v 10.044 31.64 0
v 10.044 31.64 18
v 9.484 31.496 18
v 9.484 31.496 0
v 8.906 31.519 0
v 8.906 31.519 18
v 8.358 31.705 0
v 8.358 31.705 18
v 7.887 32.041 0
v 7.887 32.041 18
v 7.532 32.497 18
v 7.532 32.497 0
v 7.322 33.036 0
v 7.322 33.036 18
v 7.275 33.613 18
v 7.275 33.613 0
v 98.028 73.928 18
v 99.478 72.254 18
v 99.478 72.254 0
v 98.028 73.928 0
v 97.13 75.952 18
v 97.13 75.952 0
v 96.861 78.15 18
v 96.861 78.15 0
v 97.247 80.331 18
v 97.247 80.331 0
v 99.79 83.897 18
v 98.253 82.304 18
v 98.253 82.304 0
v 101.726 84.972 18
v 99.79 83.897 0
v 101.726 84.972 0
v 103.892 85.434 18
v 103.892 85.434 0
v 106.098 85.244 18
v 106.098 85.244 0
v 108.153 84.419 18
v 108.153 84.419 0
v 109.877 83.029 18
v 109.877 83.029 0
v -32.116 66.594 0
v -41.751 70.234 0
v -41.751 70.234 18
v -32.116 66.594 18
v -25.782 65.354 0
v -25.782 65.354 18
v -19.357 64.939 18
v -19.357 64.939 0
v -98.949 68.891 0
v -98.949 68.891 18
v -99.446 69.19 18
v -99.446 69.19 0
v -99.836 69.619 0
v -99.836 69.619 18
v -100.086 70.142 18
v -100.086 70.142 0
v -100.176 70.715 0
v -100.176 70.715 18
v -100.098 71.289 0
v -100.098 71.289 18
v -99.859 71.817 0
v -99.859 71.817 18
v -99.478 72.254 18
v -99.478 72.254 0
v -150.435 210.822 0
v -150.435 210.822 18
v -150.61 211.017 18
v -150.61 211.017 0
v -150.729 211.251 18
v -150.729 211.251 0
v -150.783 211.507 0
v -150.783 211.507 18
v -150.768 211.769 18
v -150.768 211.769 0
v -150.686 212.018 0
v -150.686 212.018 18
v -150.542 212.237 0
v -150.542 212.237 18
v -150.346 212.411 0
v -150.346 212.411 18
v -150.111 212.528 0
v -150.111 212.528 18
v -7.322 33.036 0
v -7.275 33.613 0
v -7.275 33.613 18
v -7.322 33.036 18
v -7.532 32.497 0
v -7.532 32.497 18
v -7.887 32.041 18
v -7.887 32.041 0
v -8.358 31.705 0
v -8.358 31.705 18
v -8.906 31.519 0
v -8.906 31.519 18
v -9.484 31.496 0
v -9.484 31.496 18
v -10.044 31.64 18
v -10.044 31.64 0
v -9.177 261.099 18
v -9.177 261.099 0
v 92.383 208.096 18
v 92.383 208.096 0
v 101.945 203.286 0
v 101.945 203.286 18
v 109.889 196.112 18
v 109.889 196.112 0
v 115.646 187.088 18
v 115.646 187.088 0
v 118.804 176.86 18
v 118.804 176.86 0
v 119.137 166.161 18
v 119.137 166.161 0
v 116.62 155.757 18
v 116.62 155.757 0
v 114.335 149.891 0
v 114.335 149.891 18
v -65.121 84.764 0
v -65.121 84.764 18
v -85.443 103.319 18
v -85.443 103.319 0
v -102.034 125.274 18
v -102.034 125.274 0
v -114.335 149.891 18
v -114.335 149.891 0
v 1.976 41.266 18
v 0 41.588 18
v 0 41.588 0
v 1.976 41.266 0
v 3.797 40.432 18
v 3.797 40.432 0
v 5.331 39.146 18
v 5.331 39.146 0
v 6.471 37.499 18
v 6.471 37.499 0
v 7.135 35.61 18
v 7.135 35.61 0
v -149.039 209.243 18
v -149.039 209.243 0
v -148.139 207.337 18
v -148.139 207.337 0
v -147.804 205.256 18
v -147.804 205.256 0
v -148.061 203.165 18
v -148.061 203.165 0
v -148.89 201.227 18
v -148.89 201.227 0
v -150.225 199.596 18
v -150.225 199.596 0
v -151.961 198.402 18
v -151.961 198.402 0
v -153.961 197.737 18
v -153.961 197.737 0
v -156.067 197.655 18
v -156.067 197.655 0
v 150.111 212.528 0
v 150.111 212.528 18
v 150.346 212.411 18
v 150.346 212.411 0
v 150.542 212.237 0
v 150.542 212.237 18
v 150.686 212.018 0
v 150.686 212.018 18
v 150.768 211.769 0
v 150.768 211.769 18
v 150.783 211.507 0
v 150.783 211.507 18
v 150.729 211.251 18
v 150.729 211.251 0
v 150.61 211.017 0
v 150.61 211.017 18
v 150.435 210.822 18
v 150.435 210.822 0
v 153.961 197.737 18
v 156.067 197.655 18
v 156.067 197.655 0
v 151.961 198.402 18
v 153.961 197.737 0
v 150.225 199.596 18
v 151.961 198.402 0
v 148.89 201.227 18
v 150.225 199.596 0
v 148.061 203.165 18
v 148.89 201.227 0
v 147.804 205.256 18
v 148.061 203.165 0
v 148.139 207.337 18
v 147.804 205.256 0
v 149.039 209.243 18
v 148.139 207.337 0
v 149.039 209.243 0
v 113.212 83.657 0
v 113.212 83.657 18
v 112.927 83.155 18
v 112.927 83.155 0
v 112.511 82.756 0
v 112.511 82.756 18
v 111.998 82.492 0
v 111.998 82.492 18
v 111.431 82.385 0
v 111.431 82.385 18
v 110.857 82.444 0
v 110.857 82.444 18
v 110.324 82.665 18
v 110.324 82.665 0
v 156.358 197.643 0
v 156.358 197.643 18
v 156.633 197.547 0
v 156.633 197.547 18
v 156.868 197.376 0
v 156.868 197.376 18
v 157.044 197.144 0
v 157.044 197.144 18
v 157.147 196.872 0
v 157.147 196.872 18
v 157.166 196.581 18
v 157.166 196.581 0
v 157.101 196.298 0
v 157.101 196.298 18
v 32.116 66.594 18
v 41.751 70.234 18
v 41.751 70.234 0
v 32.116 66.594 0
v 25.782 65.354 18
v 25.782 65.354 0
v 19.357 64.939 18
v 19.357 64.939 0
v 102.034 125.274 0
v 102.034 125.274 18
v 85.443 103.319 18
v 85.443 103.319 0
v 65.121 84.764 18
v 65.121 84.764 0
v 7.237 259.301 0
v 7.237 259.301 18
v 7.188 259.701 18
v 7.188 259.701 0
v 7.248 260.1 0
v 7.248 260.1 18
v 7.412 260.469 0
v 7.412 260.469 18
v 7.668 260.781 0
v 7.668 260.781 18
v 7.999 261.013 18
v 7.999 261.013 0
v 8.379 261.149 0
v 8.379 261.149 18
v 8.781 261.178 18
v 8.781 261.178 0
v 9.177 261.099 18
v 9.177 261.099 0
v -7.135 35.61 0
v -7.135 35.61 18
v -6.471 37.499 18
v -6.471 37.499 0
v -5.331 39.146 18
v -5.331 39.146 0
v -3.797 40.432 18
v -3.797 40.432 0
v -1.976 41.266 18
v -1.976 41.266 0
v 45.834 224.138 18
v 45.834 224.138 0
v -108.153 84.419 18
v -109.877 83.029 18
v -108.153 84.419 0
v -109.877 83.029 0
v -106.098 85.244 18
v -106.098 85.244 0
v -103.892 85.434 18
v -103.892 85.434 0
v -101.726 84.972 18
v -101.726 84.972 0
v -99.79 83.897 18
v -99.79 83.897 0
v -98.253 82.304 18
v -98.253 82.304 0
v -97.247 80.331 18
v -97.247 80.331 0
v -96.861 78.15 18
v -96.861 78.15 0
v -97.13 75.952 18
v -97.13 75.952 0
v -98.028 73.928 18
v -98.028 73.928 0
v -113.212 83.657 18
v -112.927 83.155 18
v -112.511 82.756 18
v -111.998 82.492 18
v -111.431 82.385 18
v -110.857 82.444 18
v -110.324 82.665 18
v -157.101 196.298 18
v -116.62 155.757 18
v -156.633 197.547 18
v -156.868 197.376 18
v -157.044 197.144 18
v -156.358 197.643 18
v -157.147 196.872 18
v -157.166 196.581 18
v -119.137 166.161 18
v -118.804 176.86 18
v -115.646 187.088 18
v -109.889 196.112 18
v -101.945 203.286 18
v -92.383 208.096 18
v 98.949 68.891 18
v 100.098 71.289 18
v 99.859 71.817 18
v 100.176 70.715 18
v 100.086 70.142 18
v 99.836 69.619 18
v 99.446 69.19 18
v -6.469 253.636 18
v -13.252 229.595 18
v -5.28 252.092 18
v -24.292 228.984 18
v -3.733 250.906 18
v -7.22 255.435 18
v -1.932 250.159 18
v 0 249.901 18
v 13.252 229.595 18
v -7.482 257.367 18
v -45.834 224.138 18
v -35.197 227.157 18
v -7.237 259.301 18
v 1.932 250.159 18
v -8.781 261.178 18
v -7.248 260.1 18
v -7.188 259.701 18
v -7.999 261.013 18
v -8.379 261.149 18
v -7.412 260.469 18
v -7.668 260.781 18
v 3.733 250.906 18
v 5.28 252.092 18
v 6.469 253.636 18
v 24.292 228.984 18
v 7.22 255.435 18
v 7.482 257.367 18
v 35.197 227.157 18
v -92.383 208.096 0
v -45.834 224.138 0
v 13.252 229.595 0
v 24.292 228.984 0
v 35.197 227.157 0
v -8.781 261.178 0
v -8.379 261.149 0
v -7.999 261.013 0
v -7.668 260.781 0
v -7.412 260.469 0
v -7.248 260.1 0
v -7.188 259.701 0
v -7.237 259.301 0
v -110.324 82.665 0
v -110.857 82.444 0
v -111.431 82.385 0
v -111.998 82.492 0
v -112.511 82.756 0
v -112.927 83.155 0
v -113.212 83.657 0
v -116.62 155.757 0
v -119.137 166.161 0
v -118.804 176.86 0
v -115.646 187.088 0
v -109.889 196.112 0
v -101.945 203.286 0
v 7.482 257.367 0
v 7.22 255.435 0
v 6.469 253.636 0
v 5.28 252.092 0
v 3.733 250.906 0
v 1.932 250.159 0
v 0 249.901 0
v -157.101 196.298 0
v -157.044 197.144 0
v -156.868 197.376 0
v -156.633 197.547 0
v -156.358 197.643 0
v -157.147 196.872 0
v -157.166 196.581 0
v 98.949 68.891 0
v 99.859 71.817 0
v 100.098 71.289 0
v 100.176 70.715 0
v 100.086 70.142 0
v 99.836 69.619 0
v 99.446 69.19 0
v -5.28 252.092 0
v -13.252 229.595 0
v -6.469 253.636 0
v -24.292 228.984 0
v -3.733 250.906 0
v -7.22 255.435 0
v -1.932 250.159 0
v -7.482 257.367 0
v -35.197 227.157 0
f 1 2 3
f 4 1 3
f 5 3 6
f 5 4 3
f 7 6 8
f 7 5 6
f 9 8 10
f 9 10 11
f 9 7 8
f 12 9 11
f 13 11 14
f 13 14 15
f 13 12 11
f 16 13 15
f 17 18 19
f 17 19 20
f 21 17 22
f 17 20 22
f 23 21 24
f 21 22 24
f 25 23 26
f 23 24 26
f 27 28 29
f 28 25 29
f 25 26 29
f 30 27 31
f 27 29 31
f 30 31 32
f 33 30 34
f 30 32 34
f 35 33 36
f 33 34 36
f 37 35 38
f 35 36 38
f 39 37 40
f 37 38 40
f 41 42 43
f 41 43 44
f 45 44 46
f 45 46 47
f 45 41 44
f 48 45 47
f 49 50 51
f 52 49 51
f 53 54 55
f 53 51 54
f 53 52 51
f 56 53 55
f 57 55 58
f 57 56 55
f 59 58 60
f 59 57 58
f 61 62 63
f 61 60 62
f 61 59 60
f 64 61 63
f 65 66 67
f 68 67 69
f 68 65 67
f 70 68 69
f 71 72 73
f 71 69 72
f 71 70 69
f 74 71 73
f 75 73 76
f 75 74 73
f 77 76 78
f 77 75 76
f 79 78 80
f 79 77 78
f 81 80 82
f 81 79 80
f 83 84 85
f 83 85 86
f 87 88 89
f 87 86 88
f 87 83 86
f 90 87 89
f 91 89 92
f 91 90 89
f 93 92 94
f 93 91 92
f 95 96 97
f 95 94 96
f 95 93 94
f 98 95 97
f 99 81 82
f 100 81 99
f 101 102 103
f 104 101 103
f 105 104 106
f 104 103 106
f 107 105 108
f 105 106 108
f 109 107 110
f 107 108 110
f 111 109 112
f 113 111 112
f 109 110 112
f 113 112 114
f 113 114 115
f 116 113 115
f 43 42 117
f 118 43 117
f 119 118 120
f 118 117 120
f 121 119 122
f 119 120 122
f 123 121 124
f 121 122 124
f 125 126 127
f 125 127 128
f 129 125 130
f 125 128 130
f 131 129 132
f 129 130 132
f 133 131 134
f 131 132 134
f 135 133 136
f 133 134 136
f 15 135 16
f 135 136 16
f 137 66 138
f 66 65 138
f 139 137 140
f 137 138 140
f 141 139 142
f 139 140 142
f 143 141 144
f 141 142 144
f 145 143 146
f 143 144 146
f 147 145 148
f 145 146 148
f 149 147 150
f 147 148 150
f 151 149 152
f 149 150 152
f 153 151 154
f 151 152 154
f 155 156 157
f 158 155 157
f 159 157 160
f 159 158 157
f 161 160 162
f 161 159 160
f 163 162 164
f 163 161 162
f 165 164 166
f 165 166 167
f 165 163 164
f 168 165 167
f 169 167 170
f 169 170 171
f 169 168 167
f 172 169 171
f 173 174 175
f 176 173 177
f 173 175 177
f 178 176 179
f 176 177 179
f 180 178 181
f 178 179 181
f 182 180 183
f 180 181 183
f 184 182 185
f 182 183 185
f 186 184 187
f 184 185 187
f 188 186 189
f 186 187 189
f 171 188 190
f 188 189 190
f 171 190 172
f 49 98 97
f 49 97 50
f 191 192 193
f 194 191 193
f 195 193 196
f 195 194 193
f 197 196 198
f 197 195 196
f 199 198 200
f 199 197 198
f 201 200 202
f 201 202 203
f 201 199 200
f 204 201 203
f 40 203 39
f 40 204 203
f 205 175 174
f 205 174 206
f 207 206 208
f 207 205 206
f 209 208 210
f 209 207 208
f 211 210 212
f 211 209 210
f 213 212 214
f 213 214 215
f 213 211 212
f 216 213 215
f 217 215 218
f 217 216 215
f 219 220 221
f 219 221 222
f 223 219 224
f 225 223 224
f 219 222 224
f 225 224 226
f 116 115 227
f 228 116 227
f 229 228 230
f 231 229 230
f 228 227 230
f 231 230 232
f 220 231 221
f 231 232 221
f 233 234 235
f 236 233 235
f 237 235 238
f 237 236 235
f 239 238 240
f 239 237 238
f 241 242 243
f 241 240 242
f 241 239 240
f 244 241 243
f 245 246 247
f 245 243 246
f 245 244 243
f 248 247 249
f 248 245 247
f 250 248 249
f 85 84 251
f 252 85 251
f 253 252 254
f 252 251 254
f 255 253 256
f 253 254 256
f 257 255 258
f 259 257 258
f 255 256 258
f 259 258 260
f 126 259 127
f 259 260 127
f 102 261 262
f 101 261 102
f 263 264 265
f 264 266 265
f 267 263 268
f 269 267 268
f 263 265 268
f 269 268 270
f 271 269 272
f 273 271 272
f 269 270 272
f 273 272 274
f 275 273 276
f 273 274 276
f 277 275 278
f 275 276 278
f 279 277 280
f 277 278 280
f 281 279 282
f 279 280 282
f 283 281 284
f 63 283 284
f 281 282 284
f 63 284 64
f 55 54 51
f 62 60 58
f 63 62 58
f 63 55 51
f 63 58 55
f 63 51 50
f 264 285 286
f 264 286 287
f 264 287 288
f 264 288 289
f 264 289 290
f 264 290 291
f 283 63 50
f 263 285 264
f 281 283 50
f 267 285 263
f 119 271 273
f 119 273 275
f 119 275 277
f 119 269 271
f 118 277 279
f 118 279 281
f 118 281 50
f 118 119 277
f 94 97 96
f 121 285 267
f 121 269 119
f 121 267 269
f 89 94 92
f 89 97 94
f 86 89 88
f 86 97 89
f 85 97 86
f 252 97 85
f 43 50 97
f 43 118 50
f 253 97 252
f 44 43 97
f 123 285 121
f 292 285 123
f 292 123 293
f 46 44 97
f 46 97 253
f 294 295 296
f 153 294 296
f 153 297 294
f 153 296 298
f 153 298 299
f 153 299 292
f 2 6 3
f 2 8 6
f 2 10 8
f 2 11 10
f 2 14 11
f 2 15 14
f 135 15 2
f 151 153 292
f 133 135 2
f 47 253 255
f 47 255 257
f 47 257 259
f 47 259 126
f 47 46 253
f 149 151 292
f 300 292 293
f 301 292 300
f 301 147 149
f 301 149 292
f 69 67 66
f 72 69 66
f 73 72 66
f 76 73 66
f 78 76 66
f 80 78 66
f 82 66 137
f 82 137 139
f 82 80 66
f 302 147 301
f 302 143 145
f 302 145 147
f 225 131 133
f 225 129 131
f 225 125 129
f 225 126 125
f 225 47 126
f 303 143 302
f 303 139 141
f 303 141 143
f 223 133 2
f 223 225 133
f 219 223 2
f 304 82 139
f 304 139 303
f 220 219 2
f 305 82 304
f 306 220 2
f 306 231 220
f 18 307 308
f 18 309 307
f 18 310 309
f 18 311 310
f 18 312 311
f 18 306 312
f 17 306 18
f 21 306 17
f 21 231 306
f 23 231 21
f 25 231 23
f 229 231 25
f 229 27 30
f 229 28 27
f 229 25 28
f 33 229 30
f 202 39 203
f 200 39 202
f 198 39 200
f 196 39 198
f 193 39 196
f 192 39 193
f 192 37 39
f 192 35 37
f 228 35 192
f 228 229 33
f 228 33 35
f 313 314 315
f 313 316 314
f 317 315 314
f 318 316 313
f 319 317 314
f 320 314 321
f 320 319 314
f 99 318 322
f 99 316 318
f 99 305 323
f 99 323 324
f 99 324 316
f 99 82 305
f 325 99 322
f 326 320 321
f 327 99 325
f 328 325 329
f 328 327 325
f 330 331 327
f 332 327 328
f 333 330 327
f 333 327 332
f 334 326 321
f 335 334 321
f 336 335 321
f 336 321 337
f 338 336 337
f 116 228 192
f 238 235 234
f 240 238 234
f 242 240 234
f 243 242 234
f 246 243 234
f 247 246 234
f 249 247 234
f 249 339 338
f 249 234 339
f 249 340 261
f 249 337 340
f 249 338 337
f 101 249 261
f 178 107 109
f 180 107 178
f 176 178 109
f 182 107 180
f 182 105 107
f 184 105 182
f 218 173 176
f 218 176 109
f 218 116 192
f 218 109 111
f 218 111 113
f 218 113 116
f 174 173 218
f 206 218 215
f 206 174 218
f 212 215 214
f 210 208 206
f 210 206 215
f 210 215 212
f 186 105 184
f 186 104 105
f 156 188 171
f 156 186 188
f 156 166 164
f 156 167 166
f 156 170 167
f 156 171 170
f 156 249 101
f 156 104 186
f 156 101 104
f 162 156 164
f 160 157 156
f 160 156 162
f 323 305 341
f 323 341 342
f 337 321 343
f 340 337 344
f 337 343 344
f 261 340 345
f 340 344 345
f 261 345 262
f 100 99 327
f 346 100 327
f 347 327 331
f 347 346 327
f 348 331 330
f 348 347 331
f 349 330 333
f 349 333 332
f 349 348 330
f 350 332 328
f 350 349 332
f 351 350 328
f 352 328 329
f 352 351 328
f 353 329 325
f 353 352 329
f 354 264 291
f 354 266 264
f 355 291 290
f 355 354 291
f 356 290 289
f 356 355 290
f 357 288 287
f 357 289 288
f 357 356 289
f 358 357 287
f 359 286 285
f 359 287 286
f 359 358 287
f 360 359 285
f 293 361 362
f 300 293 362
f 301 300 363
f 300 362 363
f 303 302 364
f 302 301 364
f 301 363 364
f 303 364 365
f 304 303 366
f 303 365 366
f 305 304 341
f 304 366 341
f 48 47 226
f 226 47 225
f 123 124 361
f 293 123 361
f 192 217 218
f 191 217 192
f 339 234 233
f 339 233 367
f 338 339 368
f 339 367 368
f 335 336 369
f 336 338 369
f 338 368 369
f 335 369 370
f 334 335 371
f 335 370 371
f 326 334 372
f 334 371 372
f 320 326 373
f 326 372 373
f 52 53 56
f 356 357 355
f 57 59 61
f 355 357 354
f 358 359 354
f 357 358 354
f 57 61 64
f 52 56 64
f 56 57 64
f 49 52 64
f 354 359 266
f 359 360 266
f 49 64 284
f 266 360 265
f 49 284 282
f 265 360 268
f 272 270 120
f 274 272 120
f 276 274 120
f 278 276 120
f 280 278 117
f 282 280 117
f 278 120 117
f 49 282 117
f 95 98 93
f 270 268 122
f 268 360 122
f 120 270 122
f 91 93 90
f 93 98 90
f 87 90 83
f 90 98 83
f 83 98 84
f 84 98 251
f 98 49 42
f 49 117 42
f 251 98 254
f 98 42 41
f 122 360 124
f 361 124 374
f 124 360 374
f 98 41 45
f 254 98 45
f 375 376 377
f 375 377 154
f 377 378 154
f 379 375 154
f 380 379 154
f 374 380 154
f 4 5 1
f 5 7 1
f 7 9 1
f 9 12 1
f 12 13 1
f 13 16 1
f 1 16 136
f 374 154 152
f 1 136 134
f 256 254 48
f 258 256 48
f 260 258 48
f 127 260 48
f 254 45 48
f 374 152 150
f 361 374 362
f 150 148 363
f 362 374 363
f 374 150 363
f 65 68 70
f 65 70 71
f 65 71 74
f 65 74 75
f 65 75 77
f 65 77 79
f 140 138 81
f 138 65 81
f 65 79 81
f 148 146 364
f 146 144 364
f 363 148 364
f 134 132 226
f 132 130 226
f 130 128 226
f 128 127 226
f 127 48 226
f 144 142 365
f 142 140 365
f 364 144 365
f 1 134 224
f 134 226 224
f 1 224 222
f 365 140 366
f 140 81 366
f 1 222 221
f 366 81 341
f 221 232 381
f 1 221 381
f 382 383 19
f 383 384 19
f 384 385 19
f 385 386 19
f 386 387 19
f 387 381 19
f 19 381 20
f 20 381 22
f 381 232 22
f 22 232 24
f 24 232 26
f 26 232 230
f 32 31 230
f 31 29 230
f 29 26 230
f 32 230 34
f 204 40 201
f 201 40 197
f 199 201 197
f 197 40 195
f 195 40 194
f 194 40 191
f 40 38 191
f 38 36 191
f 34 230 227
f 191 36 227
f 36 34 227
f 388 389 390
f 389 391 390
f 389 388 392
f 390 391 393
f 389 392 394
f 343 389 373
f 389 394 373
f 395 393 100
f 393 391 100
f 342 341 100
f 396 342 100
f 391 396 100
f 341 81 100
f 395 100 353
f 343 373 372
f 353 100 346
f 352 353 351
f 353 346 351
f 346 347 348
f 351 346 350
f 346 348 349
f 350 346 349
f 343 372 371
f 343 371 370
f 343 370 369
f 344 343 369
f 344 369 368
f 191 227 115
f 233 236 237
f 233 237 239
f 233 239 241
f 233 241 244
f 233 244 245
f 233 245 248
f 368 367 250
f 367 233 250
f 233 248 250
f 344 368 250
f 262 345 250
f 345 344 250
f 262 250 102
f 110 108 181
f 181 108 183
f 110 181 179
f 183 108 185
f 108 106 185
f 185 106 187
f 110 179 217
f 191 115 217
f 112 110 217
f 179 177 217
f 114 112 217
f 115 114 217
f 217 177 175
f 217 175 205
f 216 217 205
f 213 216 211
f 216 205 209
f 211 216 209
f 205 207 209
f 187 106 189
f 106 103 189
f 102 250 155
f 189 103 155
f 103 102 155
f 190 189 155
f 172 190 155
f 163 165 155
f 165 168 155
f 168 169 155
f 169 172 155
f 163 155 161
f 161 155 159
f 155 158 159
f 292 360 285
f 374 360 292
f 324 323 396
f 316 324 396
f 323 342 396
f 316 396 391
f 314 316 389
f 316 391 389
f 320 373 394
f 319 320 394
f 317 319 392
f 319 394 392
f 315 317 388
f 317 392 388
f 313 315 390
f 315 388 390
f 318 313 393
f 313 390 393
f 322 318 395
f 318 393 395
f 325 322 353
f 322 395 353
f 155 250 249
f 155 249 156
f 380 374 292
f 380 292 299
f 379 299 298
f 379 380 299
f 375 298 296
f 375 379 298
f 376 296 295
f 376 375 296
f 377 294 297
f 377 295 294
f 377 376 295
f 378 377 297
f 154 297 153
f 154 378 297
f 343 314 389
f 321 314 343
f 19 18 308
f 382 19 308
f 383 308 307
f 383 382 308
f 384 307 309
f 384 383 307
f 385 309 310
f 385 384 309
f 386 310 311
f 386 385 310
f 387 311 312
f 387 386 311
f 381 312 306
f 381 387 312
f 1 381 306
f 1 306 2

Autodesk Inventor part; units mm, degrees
ref_plane "YZ Plane" through (0, 0, 0) normal (1, 0, 0) x (0, 1, 0)
ref_plane "XZ Plane" through (0, 0, 0) normal (0, 1, 0) x (-1, 0, 0)
ref_plane "XY Plane" through (0, 0, 0) normal (0, 0, 1) x (1, 0, 0)
sketch "Sketch1" plane through (0, 0, 0) normal (0, 0, 1) x (1, 0, 0)
  line L0 (0, 27.432) -> (-109.1184, 73.152)
  line L1 (-109.1184, 73.152) -> (-161.8488, 208.4832)
  line L2 (-161.8488, 208.4832) -> (0, 264.2616)
  line L3 (0, 562.8605) -> (0, -145.2705) construction
  line L4 (0, 264.2616) -> (0, 27.432)
  point P0 (0, 0)
  dimension "d9" = 264.2616
  dimension "d11" = 161.8488
  dimension "d15" = 208.4832
  dimension "d20" = 109.1184
  dimension "d22" = 73.152
  dimension "d39" = 0
  dimension "d41" = 0
  dimension "d42" = 27.432
extrude "Extrusion4" add sketch "Sketch1" along normal blind 18
hole "Hole2" at (0.0182, 257.4006, 18) direction (0, 0, -1) diameter 15 end through all
hole "Hole3" at (-155.3023, 205.1164, 18) direction (0, 0, -1) diameter 15 end through all
hole "Hole4" at (-104.3588, 77.9489, 18) direction (0, 0, -1) diameter 15 end through all
hole "Hole5" at (0.2097, 34.0914, 18) direction (0, 0, -1) diameter 15 end through all
fillet "Fillet7" radius 1.5 1 edges at (-5.647, 262.3155, 9)
fillet "Fillet8" radius 1 1 edges at (-152.0327, 211.8661, 9)
fillet "Fillet9" radius 1 1 edges at (-157.7785, 198.0369, 9)
fillet "Fillet10" radius 2 1 edges at (-111.6584, 79.6709, 9)
fillet "Fillet11" radius 2 1 edges at (-102.9745, 70.5777, 9)
fillet "Fillet12" radius 2 1 edges at (-6.056, 29.9694, 9)
sketch "Sketch5" plane through (0, 0, 18) normal (0, 0, 1) x (1, 0, 0)
  line L0 (0, 41.5885) -> (0, 249.9006) projected
  line L1 (-91.2304, 90.5943) -> (-131.73, 194.5356)
  line L2 (-131.73, 194.5356) -> (-30, 229.5951)
  line L3 (-30, 229.5951) -> (0, 229.5951)
  line L4 (-9.1769, 261.0989) -> (-150.1114, 212.5283) projected
  line L5 (-157.1008, 196.2976) -> (-113.2116, 83.657) projected
  line L6 (-98.9493, 68.8912) -> (-10.0438, 31.6403) projected
  line L7 (-91.2304, 90.5943) -> (-30, 64.9391)
  line L8 (-30, 64.9391) -> (0, 64.9391)
  point P0 (0, 0)
  dimension "d148" = 23
  dimension "d149" = 23
  dimension "d151" = 23
  dimension "d152" = 30
  dimension "d153" = 30
extrude "Extrusion5" cut sketch "Sketch5" against normal through all
fillet "Fillet14" radius 40 1 edges at (-131.73, 194.5356, 9)
fillet "Fillet15" radius 100 1 edges at (-30, 229.5951, 9)
fillet "Fillet16" radius 150 1 edges at (-91.2304, 90.5943, 9)
fillet "Fillet17" radius 50 1 edges at (-30, 64.9391, 9)
mirror "Mirror2" about plane through (0, 0, 0) normal (1, 0, 0)
properties part number "section1" material "Polyethylene, High Density"
